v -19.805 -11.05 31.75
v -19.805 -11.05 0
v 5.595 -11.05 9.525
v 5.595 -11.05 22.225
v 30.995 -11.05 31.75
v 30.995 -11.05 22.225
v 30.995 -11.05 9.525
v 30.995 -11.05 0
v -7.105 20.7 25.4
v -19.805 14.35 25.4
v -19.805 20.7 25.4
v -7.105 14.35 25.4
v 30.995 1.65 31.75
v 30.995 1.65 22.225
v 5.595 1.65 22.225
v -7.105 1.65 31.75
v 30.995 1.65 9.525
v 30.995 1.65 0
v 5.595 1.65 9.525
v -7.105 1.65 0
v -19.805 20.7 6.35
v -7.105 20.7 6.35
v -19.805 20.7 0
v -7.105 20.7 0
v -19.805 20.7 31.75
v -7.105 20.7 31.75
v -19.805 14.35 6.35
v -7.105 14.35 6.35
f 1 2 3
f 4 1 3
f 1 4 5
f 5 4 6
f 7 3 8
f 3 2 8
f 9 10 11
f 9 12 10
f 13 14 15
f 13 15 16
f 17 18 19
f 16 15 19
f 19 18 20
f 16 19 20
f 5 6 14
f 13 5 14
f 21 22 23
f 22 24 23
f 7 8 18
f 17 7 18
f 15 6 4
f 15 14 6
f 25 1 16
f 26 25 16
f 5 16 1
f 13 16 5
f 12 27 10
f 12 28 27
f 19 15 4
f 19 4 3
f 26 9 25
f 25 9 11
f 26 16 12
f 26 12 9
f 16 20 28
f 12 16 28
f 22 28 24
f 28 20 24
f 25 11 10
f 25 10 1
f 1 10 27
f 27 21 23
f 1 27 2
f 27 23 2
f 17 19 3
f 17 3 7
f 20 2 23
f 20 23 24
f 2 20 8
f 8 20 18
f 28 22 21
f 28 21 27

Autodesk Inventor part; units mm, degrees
ref_plane "YZ Plane" through (0, 0, 0) normal (1, 0, 0) x (0, 1, 0)
ref_plane "XZ Plane" through (0, 0, 0) normal (0, 1, 0) x (-1, 0, 0)
ref_plane "XY Plane" through (0, 0, 0) normal (0, 0, 1) x (1, 0, 0)
sketch "Sketch1" plane through (0, 0, 0) normal (0, 0, 1) x (1, 0, 0)
  line L0 (-19.8053, 20.7004) -> (-19.8053, -11.0496)
  line L1 (-19.8053, -11.0496) -> (30.9947, -11.0496)
  line L2 (30.9947, -11.0496) -> (30.9947, 1.6504)
  line L3 (30.9947, 1.6504) -> (-7.1053, 1.6504)
  line L4 (-7.1053, 1.6504) -> (-7.1053, 20.7004)
  line L5 (-7.1053, 20.7004) -> (-19.8053, 20.7004)
  point P0 (0, 0)
  dimension "d0" = 12.7
  dimension "d1" = 50.8
  dimension "d2" = 12.7
  dimension "d3" = 31.75
extrude "Extrusion1" add sketch "Sketch1" along normal blind 31.75
sketch "Sketch2" plane through (-7.1053, 1.6504, 0) normal (1, 0, 0) x (0, 0, -1)
  line L0 (0, 19.05) -> (-31.75, 19.05) projected
  line L1 (-25.4, 19.05) -> (-6.35, 19.05)
  line L2 (-6.35, 19.05) -> (-6.35, 12.7)
  line L3 (-6.35, 12.7) -> (-25.4, 12.7)
  line L4 (-25.4, 12.7) -> (-25.4, 19.05)
  line L5 (-31.75, 0) -> (-31.75, 19.05) projected
  line L6 (0, 0) -> (0, 19.05) projected
  point P0 (0, -1.6504)
  dimension "d6" = 6.35
  dimension "d7" = 6.35
  dimension "d8" = 6.35
extrude "Extrusion2" cut sketch "Sketch2" against normal blind 31.75
sketch "Sketch3" plane through (-7.1053, 1.6504, 0) normal (0, 1, 0) x (1, 0, 0)
  line L0 (38.1, 0) -> (38.1, -31.75) projected
  line L1 (38.1, -22.225) -> (12.7, -22.225)
  line L2 (12.7, -22.225) -> (12.7, -9.525)
  line L3 (12.7, -9.525) -> (38.1, -9.525)
  line L4 (38.1, -9.525) -> (38.1, -22.225)
  line L5 (-12.7, 0) -> (38.1, 0) projected
  line L6 (38.1, -31.75) -> (0, -31.75) projected
  point P0 (7.1053, 0)
  dimension "d11" = 9.525
  dimension "d12" = 9.525
  dimension "d13" = 25.4
extrude "Extrusion3" cut sketch "Sketch3" against normal blind 31.75
properties part number "Figure 7_27_1"
